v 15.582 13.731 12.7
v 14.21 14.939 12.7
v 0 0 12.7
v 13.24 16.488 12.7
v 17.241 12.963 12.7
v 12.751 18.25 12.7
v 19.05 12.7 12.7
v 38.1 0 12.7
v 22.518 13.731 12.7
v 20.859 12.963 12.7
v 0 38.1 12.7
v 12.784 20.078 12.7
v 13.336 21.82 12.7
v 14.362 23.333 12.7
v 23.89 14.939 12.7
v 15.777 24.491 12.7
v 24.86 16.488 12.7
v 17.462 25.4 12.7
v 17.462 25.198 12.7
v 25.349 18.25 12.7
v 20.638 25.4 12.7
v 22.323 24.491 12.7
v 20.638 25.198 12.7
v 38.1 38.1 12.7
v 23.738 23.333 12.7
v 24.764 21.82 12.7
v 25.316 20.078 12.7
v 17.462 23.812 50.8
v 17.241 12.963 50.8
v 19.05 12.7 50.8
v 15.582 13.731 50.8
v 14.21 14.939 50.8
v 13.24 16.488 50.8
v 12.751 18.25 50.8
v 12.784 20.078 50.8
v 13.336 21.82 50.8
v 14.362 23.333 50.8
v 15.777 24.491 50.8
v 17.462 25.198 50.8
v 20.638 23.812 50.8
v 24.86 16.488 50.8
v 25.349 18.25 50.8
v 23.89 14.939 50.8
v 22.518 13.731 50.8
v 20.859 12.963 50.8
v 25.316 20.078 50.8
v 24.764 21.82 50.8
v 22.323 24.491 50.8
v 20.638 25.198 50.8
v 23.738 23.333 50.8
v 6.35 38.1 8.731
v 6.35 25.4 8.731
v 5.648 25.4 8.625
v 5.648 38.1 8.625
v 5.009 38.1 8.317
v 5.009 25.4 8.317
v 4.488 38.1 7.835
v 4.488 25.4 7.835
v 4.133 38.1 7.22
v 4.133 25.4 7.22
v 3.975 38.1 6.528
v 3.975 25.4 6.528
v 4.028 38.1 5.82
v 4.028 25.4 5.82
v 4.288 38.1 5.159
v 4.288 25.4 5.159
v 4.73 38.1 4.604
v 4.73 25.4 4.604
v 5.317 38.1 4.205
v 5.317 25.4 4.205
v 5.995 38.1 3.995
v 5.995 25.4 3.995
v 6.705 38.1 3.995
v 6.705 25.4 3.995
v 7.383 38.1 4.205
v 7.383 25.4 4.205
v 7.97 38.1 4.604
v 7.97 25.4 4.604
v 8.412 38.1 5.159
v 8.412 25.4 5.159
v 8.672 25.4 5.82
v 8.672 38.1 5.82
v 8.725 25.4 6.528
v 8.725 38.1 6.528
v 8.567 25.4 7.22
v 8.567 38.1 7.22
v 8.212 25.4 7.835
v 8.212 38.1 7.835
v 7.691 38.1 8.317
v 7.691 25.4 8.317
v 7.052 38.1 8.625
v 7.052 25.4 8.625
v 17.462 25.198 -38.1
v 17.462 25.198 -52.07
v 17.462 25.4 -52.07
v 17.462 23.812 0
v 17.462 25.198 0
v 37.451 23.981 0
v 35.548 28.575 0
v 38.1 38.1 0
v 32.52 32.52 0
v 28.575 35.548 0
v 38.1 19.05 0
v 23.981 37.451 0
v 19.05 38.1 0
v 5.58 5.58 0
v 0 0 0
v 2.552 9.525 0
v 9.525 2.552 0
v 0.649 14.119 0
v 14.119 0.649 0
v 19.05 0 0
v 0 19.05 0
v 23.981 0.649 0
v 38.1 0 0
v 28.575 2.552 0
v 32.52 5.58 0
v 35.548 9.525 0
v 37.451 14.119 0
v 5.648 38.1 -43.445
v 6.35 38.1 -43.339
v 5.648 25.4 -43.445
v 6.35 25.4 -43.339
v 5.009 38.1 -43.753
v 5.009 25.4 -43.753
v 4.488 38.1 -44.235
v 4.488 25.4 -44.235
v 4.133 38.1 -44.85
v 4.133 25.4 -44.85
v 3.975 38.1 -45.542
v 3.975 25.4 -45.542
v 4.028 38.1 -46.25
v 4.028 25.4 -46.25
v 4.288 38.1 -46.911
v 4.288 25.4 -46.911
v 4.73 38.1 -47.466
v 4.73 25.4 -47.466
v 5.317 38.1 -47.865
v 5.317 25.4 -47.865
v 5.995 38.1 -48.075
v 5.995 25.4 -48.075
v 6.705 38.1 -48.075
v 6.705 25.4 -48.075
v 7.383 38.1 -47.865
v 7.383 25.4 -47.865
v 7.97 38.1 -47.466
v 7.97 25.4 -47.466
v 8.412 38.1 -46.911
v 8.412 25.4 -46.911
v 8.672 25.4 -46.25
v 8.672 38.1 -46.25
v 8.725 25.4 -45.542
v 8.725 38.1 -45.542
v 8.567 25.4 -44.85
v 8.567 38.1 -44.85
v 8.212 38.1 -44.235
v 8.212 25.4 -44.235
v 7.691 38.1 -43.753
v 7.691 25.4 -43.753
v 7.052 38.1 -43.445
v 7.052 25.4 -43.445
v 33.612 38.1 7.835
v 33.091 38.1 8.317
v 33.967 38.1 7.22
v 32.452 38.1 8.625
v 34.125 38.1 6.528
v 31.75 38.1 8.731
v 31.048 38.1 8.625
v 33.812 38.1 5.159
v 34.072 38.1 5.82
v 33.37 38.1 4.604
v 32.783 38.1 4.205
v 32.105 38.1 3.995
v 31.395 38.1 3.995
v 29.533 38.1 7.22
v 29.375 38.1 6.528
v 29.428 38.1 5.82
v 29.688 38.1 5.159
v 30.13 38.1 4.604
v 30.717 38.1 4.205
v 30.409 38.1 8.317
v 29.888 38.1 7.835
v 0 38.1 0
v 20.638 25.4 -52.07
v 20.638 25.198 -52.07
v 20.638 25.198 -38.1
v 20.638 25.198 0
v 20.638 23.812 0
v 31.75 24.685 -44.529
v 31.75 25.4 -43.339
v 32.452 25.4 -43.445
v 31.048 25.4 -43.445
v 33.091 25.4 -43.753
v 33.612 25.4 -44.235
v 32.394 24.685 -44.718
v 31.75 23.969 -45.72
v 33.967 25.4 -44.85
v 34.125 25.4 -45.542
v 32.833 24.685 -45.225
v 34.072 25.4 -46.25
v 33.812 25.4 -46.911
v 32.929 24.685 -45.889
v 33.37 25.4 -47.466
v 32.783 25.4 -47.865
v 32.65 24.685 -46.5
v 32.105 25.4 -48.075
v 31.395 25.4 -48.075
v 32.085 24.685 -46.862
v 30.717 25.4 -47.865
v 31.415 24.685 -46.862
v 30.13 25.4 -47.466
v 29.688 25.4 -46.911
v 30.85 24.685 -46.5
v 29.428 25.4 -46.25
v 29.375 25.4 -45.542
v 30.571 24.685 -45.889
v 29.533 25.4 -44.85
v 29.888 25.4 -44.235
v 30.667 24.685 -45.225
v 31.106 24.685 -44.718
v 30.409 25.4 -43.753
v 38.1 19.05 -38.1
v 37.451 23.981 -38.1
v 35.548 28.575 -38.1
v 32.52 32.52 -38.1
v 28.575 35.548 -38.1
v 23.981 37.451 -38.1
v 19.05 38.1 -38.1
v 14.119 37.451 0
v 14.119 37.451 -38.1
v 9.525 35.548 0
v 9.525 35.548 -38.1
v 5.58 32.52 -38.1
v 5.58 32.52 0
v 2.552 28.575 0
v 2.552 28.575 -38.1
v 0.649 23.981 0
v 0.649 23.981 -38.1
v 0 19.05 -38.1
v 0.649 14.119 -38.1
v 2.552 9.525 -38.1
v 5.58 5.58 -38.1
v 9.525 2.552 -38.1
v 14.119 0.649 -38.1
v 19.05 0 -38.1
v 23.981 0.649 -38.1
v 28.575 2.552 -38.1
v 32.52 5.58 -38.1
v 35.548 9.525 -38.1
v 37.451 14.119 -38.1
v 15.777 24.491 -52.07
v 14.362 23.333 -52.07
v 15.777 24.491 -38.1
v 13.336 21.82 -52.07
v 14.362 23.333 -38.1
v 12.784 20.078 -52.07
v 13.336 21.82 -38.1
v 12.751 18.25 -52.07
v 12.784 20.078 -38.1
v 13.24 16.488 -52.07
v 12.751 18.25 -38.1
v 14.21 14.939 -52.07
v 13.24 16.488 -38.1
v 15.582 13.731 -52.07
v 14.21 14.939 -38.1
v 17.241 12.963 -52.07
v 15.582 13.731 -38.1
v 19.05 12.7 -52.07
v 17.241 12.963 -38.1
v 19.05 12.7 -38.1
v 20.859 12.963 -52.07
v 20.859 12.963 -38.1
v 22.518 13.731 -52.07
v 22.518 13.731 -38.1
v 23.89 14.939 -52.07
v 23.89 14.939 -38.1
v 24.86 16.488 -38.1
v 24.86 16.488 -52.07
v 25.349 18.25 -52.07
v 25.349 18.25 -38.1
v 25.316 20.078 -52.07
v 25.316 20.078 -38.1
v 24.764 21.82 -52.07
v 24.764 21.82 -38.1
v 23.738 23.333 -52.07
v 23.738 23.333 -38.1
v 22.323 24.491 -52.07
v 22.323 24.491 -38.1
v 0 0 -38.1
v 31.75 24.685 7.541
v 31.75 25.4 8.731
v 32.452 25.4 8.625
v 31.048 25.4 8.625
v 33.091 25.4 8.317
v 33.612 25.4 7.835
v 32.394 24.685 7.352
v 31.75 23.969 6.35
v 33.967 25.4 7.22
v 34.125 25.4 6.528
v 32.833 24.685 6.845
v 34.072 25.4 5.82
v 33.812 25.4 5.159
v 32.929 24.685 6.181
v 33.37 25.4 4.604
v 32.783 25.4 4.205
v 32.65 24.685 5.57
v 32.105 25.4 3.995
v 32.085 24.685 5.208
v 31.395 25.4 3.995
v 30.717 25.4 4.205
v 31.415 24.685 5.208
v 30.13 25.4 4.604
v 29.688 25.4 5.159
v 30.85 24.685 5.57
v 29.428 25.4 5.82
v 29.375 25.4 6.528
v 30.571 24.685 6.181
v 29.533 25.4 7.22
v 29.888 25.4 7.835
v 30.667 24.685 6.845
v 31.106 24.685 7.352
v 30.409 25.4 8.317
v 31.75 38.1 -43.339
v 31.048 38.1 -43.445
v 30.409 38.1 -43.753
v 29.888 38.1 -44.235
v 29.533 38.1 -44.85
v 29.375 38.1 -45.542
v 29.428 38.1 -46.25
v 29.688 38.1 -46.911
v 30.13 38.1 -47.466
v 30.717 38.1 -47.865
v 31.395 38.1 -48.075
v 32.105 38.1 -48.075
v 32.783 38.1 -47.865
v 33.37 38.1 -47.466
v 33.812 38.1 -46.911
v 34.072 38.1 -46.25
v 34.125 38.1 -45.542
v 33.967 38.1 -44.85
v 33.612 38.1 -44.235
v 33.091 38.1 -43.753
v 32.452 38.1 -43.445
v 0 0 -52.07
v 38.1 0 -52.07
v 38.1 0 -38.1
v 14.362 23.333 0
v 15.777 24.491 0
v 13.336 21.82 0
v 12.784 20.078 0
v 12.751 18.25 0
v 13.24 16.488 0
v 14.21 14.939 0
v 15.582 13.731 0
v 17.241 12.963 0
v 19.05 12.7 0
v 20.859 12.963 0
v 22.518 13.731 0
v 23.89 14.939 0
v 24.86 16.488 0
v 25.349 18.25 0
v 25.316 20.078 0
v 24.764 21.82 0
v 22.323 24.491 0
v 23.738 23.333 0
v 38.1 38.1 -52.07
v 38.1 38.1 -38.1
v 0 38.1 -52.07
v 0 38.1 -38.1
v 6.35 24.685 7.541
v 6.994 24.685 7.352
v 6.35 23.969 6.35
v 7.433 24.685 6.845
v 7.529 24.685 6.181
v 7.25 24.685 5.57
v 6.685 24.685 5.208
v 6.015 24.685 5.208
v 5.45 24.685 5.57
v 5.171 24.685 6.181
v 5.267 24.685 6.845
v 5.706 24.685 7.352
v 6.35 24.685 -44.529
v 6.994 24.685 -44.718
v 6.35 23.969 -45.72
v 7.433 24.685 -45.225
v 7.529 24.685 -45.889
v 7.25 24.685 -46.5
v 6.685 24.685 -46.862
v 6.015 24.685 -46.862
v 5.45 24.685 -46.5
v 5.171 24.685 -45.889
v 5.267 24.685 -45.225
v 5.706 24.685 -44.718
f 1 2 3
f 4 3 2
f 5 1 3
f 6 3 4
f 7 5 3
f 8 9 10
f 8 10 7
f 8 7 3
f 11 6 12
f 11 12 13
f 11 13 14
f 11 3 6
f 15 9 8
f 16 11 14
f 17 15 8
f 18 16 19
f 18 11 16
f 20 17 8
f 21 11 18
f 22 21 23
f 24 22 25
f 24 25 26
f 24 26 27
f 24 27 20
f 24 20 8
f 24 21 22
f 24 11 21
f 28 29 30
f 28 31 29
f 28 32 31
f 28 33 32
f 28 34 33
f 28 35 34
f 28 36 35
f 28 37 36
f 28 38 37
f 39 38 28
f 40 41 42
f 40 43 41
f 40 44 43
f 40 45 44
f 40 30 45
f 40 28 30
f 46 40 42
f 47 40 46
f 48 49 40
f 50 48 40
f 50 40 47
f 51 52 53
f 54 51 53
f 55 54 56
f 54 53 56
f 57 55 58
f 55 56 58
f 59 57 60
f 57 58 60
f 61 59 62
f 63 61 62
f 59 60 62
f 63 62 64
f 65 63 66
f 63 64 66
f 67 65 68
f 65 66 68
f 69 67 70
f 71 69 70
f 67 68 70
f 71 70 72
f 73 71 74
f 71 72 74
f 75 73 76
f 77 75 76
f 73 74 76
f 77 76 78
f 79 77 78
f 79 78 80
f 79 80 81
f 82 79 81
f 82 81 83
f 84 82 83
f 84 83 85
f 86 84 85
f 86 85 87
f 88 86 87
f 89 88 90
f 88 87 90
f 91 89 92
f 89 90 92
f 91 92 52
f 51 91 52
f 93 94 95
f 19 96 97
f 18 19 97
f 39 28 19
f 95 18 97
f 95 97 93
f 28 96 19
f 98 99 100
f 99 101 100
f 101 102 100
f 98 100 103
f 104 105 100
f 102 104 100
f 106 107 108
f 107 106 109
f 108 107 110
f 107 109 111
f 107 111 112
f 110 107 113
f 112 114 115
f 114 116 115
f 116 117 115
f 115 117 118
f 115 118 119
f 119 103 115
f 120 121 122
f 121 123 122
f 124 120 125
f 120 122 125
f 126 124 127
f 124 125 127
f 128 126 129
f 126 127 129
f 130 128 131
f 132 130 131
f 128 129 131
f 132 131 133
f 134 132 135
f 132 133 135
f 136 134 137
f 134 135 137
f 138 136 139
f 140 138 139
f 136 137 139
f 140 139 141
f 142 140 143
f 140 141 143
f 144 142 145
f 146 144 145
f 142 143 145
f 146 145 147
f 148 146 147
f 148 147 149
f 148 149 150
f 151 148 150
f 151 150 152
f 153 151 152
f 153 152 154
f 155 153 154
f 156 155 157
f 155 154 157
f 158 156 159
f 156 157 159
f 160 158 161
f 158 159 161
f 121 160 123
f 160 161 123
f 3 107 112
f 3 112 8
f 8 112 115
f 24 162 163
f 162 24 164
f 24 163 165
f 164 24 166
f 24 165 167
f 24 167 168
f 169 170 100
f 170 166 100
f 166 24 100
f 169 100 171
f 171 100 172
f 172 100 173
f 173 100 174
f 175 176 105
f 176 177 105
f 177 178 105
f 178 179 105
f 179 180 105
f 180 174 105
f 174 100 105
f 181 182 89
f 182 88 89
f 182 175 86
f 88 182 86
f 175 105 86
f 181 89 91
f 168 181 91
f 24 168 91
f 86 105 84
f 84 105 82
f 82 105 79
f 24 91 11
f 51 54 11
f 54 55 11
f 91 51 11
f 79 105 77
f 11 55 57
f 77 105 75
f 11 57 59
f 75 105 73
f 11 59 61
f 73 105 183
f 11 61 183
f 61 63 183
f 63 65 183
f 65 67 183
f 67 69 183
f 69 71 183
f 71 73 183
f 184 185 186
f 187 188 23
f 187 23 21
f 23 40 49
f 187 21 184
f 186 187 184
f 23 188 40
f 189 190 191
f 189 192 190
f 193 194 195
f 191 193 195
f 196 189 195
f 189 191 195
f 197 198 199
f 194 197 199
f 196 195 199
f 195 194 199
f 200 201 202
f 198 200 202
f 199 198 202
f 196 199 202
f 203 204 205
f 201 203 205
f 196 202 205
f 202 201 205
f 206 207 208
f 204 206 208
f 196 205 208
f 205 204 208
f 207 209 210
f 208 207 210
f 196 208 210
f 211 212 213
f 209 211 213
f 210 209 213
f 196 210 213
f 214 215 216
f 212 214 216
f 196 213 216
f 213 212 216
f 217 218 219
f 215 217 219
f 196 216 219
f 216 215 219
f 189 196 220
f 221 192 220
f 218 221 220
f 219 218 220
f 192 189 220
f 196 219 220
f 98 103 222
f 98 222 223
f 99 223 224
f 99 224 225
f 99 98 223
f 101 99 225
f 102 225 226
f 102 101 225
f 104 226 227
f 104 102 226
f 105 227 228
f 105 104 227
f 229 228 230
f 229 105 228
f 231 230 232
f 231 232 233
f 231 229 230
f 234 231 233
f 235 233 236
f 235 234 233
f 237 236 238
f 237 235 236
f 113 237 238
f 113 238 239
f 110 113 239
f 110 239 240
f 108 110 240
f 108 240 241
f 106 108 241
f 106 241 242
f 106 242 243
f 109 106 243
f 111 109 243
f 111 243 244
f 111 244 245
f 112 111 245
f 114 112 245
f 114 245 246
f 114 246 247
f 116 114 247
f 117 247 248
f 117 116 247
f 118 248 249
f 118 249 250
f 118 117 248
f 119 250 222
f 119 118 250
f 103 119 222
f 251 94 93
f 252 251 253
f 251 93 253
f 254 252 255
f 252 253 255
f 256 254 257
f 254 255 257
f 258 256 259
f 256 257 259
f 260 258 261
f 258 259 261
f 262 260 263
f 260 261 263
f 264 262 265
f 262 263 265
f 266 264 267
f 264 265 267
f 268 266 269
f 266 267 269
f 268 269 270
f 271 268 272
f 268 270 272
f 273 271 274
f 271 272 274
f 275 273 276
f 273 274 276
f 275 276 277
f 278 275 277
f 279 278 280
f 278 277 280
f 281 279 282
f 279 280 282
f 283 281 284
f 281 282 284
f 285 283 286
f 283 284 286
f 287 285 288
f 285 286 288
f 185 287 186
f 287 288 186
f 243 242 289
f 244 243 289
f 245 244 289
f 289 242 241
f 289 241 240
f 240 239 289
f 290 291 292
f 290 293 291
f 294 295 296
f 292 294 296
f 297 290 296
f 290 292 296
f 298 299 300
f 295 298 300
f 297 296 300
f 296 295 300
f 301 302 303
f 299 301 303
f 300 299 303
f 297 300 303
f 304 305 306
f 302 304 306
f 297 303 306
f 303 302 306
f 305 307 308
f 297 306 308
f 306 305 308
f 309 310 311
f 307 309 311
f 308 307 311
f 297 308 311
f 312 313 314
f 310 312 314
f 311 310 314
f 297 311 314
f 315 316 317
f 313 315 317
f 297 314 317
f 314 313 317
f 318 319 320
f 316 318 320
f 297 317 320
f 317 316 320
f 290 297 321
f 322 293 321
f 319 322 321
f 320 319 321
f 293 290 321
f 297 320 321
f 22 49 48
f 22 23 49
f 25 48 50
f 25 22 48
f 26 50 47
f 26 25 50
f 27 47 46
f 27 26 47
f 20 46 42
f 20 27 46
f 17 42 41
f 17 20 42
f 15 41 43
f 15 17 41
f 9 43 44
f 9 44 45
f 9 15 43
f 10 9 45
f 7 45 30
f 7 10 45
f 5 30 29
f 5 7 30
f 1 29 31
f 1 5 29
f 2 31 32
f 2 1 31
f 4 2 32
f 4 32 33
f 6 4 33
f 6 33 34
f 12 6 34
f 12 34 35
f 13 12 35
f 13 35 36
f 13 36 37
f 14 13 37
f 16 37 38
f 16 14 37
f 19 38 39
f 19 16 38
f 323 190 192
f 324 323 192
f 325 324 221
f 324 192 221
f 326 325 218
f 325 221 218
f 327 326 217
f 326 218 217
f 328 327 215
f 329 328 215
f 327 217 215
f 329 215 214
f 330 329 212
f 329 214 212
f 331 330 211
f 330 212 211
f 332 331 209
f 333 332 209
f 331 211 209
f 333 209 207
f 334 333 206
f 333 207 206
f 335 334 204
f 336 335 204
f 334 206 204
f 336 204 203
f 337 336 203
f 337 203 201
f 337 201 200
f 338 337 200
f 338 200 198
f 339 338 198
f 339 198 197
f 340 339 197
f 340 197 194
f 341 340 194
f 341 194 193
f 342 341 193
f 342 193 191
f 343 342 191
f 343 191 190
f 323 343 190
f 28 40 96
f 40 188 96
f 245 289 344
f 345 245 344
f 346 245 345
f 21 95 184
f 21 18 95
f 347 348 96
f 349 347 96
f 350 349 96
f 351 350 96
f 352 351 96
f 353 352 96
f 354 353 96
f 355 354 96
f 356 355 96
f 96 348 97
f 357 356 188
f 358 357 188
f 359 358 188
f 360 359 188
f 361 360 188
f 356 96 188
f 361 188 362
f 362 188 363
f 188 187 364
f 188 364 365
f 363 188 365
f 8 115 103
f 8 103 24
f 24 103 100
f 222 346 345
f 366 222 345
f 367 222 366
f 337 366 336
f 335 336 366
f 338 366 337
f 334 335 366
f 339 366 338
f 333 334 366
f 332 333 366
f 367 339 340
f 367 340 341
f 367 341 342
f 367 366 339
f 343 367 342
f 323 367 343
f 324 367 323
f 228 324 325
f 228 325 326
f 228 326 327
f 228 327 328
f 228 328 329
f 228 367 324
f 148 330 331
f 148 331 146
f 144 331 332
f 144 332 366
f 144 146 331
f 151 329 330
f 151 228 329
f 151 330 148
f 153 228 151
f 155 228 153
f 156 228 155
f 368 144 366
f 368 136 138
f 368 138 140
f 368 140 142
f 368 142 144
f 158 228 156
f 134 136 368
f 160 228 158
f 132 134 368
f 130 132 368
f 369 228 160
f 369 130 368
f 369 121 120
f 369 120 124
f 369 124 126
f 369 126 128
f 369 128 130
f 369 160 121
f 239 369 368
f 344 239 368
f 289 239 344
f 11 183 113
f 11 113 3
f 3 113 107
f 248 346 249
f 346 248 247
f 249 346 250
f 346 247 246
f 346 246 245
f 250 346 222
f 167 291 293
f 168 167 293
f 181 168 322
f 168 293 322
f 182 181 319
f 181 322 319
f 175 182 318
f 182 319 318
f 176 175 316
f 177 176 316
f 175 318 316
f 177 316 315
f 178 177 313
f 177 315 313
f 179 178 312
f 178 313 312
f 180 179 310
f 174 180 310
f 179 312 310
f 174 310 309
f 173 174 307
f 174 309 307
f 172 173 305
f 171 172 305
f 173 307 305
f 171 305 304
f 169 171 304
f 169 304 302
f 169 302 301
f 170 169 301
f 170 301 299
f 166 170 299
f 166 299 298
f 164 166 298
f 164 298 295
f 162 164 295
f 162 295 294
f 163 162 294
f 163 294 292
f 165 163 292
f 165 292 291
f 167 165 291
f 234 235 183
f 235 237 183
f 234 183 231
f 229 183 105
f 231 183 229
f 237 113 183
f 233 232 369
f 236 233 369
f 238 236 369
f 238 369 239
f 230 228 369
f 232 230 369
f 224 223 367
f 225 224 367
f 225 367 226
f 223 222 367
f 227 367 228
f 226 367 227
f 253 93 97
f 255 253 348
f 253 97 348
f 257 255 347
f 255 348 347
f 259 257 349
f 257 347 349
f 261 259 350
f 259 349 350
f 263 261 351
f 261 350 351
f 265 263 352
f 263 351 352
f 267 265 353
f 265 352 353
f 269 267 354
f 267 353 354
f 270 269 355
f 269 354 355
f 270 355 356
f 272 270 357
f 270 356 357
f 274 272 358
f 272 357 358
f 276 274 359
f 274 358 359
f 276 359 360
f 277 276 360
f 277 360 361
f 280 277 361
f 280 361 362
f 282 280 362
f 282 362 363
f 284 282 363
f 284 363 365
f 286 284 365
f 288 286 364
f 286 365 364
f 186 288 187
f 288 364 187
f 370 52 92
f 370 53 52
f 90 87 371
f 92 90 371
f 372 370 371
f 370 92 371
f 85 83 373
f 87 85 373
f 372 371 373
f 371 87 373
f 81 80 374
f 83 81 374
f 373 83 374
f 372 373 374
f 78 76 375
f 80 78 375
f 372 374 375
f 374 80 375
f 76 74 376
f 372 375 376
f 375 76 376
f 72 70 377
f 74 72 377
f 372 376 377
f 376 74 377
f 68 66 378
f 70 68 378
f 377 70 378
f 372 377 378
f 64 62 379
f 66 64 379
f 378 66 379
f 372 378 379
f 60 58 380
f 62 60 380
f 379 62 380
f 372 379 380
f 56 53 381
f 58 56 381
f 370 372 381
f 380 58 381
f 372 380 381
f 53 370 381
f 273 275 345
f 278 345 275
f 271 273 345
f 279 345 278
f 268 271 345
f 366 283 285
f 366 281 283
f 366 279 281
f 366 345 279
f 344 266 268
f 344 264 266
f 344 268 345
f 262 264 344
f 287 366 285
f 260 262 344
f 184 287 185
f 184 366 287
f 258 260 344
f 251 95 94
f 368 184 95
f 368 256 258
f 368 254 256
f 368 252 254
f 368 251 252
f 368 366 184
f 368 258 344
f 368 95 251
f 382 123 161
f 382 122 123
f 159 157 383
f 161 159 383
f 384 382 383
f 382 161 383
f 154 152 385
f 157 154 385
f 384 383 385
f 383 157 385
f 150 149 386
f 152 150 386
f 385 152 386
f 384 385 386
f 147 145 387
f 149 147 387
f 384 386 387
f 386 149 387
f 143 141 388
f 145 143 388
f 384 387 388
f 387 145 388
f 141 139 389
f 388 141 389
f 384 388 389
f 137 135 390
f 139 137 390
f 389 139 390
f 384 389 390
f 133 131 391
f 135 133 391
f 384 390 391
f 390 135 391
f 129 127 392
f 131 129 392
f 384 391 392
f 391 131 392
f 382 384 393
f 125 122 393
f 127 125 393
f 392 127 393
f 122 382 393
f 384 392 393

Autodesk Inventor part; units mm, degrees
ref_plane "YZ Plane" through (0, 0, 0) normal (1, 0, 0) x (0, 1, 0)
ref_plane "XZ Plane" through (0, 0, 0) normal (0, 1, 0) x (-1, 0, 0)
ref_plane "XY Plane" through (0, 0, 0) normal (0, 0, 1) x (1, 0, 0)
sketch "Sketch1" plane through (0, 0, 0) normal (0, 0, 1) x (1, 0, 0)
  line L0 (0, 0) -> (38.1, 0)
  line L1 (38.1, 0) -> (38.1, 38.1)
  line L2 (38.1, 38.1) -> (0, 38.1)
  line L3 (0, 38.1) -> (0, 0)
  circle A0 centre (19.05, 19.05) radius 6.35
  line L4 (20.6375, 23.8125) -> (17.4625, 23.8125)
  line L5 (17.4625, 25.4) -> (20.6375, 25.4)
  line L6 (20.6375, 23.8125) -> (20.6375, 25.4)
  line L7 (17.4625, 23.8125) -> (17.4625, 25.4)
  circle A1 centre (19.05, 19.05) radius 19.05
  point P0 (19.05, 0)
  point P1 (0, 19.05)
  point P2 (19.05, 23.8125)
  dimension "d0" = 38.1
  dimension "d1" = 38.1
  dimension "d2" = 12.7
  dimension "d3" = 3.175
extrude "Extrusion1" add sketch "Sketch1" along normal blind 12.7 contours L3 A1 L0 | A1 L1 L0 | A1 | L3 L2 A1 | A1 L2 L1 | A0 L7 L4 L6 | L6 L4 L7 A0
extrude "Extrusion2" add sketch "Sketch1" along normal blind 50.8 contours A0 L7 L4 L6 | L6 L4 L7 A0
extrude "Extrusion3" cut sketch "Sketch1" along normal blind 50.8 contours L6 L4 L7 A0 | A0 L5 L6 | L7 L5 A0 picked at (19.05, 24.3417)
extrude "Extrusion4" add sketch "Sketch1" against normal blind 38.1 contours A1
sketch "Sketch2" plane through (19.05, 19.05, -38.1) normal (0, 0, -1) x (-1, 0, 0)
  arc A0 (-1.5875, 6.1484) -> (1.5875, 6.1484) centre (0, 0) ccw projected
  line L0 (-1.5875, 6.1484) -> (-1.5875, 6.35) projected
  line L1 (-1.5875, 6.35) -> (1.5875, 6.35) projected
  line L2 (1.5875, 6.35) -> (1.5875, 6.1484) projected
  circle A1 centre (0, 0) radius 19.05 projected
  line L3 (-19.05, 19.05) -> (19.05, 19.05)
  line L4 (19.05, 19.05) -> (19.05, -19.05)
  line L5 (19.05, -19.05) -> (-19.05, -19.05)
  line L6 (-19.05, -19.05) -> (-19.05, 19.05)
extrude "Extrusion5" add sketch "Sketch2" along normal blind 13.97
sketch "Sketch3" plane through (0, 38.1, 12.7) normal (0, 1, 0) x (1, 0, 0)
  line L0 (0, 0) -> (38.1, 0) projected
  line L1 (0, 12.7) -> (0, 0) projected
  point P0 (31.75, 6.35)
  point P1 (6.35, 6.35)
  point P2 (6.35, 58.42)
  point P3 (31.75, 58.42)
  point P4 (0, 64.77)
  dimension "d15" = 6.35
  dimension "d16" = 25.4
  dimension "d17" = 6.35
  dimension "d18" = 6.35
hole "Hole1" at (31.75, 38.1, 6.35) at (6.35, 38.1, 6.35) at (6.35, 38.1, -45.72) at (31.75, 38.1, -45.72) direction (0, -1, 0) diameter 4.7625 depth 12.7 tip angle 118
thread "Thread1" size "10-32 UNF" class "2B" standard "ANSI Unified Screw Threads" full length
thread "Thread2" size "10-32 UNF" class "2B" standard "ANSI Unified Screw Threads" full length
thread "Thread3" size "10-24 UNC" class "2B" standard "ANSI Unified Screw Threads" full length
thread "Thread4" size "10-24 UNC" class "2B" standard "ANSI Unified Screw Threads" full length
properties part number "hack_p60"
